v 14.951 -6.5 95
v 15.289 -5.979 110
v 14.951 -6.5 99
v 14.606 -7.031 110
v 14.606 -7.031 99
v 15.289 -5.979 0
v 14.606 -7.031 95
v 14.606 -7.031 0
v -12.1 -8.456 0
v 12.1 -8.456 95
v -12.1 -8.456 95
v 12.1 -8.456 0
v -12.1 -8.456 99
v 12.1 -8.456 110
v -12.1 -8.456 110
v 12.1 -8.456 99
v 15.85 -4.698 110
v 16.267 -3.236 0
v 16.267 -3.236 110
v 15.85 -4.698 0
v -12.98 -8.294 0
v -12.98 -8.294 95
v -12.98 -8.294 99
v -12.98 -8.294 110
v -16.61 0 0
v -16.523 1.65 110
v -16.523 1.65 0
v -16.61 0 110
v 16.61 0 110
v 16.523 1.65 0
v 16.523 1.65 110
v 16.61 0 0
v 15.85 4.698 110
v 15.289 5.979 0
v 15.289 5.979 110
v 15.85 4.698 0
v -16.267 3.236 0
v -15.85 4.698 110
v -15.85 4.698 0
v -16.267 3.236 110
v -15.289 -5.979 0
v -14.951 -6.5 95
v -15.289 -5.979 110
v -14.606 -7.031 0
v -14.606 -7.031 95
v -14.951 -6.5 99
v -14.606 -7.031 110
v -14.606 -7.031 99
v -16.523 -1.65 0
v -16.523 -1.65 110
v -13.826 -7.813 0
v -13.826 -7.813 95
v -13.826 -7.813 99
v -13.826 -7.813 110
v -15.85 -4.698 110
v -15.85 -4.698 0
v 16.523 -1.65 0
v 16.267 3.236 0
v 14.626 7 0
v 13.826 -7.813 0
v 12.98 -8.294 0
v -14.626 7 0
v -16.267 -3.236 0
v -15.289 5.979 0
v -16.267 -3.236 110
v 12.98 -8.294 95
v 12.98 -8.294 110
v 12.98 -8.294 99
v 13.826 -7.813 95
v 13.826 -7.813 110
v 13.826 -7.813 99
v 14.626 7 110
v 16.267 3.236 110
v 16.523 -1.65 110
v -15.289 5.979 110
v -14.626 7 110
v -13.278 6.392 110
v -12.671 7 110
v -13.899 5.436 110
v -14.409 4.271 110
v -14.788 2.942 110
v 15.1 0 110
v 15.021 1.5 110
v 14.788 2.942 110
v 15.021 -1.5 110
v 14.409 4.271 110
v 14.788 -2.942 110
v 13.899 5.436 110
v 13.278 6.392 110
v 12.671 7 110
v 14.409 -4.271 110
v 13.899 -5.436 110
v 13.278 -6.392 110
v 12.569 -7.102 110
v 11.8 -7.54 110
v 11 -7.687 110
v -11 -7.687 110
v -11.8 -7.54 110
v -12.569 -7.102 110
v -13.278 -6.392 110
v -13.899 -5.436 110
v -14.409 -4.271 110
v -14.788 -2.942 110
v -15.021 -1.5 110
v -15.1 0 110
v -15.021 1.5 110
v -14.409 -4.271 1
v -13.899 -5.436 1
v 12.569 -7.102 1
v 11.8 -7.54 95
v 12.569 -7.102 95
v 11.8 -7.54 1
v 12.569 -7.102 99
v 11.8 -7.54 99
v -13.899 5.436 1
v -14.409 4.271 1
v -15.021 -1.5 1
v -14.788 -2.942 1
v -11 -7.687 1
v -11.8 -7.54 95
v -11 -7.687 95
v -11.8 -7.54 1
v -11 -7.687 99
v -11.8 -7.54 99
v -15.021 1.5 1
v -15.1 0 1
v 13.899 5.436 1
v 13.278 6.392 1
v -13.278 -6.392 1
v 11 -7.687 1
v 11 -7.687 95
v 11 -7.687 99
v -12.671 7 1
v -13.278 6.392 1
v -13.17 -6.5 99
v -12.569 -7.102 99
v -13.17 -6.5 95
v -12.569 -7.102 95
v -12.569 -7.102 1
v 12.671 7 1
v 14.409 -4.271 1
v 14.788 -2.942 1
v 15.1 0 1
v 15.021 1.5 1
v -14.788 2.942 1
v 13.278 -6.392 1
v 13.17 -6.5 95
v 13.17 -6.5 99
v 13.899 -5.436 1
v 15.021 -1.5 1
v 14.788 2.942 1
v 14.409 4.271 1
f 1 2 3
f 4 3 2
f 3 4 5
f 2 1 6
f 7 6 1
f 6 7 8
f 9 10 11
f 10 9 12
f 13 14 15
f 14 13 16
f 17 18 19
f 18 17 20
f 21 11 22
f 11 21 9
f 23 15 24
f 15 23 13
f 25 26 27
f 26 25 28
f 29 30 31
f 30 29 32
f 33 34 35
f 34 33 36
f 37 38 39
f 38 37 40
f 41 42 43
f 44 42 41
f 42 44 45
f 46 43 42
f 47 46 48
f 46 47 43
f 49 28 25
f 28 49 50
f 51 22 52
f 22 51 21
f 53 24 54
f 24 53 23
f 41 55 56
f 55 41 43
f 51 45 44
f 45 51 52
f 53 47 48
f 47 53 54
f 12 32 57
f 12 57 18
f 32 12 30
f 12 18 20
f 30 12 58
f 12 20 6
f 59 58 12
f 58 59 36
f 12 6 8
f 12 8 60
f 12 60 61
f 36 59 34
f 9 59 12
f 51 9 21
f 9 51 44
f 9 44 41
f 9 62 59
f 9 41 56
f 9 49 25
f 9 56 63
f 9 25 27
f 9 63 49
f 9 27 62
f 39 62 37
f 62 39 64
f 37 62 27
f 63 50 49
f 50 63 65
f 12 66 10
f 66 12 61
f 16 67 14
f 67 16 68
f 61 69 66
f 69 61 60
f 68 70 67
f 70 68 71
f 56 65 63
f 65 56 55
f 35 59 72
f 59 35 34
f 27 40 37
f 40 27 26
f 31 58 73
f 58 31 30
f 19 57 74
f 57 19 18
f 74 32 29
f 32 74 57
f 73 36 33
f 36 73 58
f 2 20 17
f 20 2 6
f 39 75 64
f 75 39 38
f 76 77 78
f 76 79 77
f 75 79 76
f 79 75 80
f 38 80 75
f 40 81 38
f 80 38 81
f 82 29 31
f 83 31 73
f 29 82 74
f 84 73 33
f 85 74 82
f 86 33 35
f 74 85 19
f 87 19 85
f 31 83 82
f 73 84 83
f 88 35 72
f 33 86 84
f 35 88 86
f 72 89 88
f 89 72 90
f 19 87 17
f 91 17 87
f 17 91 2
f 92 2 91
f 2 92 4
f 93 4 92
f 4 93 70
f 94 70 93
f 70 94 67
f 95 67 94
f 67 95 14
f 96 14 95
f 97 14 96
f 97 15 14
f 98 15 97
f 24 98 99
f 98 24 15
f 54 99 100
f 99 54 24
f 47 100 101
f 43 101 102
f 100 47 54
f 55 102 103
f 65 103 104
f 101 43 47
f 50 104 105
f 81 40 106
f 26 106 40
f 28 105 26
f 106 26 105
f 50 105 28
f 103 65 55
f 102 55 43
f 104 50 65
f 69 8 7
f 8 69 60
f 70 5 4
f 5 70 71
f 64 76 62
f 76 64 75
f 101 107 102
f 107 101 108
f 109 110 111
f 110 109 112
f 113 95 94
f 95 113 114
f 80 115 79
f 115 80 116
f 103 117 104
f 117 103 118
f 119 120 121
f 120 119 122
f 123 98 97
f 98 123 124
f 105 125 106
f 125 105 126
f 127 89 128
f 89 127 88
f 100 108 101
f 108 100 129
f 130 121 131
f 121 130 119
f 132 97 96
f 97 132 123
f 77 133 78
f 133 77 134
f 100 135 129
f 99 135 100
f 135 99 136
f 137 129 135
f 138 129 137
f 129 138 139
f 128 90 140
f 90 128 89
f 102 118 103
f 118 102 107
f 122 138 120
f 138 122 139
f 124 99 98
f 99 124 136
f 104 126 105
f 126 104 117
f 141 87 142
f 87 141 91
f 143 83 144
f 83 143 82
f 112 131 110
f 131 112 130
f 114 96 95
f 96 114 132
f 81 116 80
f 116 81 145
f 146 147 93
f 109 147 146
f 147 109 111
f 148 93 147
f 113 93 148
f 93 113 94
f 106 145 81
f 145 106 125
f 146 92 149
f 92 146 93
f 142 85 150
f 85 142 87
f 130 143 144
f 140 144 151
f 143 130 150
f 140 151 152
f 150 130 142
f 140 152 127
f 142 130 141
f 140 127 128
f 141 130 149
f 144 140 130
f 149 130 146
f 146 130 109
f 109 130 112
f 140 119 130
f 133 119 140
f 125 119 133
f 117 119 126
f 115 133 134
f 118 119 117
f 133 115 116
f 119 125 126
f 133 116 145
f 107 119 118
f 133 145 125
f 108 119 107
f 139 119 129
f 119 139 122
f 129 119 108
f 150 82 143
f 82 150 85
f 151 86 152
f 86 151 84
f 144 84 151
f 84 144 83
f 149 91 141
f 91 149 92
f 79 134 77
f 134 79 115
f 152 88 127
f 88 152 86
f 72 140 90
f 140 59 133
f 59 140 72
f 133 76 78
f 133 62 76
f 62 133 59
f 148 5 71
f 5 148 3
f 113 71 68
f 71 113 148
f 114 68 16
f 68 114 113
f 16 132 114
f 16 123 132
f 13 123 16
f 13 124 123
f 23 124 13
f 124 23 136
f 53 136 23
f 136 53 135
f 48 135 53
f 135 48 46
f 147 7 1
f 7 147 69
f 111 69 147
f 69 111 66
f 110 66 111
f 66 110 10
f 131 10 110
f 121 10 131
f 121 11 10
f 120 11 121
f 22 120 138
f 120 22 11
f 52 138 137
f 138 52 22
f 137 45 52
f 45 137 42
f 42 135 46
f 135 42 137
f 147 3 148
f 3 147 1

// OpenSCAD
module remote()
{
    //30x110x15;
    scale([1,15/8,1])
    hull(){
        translate([-11,0,0])
            cylinder(r=4.1, h=110);
        translate([ 11,0,0])
            cylinder(r=4.1, h=110);
    }
}

difference() {
    scale([1.1, 1.1,1])
        remote($fn=32);
    translate([0,0,1])
        remote($fn=32);
    translate([0,107,99])
        cube([200,200, 200], center=true);
    
    translate([0,-8,97])
        cube([40,3, 4], center=true);
}
        
